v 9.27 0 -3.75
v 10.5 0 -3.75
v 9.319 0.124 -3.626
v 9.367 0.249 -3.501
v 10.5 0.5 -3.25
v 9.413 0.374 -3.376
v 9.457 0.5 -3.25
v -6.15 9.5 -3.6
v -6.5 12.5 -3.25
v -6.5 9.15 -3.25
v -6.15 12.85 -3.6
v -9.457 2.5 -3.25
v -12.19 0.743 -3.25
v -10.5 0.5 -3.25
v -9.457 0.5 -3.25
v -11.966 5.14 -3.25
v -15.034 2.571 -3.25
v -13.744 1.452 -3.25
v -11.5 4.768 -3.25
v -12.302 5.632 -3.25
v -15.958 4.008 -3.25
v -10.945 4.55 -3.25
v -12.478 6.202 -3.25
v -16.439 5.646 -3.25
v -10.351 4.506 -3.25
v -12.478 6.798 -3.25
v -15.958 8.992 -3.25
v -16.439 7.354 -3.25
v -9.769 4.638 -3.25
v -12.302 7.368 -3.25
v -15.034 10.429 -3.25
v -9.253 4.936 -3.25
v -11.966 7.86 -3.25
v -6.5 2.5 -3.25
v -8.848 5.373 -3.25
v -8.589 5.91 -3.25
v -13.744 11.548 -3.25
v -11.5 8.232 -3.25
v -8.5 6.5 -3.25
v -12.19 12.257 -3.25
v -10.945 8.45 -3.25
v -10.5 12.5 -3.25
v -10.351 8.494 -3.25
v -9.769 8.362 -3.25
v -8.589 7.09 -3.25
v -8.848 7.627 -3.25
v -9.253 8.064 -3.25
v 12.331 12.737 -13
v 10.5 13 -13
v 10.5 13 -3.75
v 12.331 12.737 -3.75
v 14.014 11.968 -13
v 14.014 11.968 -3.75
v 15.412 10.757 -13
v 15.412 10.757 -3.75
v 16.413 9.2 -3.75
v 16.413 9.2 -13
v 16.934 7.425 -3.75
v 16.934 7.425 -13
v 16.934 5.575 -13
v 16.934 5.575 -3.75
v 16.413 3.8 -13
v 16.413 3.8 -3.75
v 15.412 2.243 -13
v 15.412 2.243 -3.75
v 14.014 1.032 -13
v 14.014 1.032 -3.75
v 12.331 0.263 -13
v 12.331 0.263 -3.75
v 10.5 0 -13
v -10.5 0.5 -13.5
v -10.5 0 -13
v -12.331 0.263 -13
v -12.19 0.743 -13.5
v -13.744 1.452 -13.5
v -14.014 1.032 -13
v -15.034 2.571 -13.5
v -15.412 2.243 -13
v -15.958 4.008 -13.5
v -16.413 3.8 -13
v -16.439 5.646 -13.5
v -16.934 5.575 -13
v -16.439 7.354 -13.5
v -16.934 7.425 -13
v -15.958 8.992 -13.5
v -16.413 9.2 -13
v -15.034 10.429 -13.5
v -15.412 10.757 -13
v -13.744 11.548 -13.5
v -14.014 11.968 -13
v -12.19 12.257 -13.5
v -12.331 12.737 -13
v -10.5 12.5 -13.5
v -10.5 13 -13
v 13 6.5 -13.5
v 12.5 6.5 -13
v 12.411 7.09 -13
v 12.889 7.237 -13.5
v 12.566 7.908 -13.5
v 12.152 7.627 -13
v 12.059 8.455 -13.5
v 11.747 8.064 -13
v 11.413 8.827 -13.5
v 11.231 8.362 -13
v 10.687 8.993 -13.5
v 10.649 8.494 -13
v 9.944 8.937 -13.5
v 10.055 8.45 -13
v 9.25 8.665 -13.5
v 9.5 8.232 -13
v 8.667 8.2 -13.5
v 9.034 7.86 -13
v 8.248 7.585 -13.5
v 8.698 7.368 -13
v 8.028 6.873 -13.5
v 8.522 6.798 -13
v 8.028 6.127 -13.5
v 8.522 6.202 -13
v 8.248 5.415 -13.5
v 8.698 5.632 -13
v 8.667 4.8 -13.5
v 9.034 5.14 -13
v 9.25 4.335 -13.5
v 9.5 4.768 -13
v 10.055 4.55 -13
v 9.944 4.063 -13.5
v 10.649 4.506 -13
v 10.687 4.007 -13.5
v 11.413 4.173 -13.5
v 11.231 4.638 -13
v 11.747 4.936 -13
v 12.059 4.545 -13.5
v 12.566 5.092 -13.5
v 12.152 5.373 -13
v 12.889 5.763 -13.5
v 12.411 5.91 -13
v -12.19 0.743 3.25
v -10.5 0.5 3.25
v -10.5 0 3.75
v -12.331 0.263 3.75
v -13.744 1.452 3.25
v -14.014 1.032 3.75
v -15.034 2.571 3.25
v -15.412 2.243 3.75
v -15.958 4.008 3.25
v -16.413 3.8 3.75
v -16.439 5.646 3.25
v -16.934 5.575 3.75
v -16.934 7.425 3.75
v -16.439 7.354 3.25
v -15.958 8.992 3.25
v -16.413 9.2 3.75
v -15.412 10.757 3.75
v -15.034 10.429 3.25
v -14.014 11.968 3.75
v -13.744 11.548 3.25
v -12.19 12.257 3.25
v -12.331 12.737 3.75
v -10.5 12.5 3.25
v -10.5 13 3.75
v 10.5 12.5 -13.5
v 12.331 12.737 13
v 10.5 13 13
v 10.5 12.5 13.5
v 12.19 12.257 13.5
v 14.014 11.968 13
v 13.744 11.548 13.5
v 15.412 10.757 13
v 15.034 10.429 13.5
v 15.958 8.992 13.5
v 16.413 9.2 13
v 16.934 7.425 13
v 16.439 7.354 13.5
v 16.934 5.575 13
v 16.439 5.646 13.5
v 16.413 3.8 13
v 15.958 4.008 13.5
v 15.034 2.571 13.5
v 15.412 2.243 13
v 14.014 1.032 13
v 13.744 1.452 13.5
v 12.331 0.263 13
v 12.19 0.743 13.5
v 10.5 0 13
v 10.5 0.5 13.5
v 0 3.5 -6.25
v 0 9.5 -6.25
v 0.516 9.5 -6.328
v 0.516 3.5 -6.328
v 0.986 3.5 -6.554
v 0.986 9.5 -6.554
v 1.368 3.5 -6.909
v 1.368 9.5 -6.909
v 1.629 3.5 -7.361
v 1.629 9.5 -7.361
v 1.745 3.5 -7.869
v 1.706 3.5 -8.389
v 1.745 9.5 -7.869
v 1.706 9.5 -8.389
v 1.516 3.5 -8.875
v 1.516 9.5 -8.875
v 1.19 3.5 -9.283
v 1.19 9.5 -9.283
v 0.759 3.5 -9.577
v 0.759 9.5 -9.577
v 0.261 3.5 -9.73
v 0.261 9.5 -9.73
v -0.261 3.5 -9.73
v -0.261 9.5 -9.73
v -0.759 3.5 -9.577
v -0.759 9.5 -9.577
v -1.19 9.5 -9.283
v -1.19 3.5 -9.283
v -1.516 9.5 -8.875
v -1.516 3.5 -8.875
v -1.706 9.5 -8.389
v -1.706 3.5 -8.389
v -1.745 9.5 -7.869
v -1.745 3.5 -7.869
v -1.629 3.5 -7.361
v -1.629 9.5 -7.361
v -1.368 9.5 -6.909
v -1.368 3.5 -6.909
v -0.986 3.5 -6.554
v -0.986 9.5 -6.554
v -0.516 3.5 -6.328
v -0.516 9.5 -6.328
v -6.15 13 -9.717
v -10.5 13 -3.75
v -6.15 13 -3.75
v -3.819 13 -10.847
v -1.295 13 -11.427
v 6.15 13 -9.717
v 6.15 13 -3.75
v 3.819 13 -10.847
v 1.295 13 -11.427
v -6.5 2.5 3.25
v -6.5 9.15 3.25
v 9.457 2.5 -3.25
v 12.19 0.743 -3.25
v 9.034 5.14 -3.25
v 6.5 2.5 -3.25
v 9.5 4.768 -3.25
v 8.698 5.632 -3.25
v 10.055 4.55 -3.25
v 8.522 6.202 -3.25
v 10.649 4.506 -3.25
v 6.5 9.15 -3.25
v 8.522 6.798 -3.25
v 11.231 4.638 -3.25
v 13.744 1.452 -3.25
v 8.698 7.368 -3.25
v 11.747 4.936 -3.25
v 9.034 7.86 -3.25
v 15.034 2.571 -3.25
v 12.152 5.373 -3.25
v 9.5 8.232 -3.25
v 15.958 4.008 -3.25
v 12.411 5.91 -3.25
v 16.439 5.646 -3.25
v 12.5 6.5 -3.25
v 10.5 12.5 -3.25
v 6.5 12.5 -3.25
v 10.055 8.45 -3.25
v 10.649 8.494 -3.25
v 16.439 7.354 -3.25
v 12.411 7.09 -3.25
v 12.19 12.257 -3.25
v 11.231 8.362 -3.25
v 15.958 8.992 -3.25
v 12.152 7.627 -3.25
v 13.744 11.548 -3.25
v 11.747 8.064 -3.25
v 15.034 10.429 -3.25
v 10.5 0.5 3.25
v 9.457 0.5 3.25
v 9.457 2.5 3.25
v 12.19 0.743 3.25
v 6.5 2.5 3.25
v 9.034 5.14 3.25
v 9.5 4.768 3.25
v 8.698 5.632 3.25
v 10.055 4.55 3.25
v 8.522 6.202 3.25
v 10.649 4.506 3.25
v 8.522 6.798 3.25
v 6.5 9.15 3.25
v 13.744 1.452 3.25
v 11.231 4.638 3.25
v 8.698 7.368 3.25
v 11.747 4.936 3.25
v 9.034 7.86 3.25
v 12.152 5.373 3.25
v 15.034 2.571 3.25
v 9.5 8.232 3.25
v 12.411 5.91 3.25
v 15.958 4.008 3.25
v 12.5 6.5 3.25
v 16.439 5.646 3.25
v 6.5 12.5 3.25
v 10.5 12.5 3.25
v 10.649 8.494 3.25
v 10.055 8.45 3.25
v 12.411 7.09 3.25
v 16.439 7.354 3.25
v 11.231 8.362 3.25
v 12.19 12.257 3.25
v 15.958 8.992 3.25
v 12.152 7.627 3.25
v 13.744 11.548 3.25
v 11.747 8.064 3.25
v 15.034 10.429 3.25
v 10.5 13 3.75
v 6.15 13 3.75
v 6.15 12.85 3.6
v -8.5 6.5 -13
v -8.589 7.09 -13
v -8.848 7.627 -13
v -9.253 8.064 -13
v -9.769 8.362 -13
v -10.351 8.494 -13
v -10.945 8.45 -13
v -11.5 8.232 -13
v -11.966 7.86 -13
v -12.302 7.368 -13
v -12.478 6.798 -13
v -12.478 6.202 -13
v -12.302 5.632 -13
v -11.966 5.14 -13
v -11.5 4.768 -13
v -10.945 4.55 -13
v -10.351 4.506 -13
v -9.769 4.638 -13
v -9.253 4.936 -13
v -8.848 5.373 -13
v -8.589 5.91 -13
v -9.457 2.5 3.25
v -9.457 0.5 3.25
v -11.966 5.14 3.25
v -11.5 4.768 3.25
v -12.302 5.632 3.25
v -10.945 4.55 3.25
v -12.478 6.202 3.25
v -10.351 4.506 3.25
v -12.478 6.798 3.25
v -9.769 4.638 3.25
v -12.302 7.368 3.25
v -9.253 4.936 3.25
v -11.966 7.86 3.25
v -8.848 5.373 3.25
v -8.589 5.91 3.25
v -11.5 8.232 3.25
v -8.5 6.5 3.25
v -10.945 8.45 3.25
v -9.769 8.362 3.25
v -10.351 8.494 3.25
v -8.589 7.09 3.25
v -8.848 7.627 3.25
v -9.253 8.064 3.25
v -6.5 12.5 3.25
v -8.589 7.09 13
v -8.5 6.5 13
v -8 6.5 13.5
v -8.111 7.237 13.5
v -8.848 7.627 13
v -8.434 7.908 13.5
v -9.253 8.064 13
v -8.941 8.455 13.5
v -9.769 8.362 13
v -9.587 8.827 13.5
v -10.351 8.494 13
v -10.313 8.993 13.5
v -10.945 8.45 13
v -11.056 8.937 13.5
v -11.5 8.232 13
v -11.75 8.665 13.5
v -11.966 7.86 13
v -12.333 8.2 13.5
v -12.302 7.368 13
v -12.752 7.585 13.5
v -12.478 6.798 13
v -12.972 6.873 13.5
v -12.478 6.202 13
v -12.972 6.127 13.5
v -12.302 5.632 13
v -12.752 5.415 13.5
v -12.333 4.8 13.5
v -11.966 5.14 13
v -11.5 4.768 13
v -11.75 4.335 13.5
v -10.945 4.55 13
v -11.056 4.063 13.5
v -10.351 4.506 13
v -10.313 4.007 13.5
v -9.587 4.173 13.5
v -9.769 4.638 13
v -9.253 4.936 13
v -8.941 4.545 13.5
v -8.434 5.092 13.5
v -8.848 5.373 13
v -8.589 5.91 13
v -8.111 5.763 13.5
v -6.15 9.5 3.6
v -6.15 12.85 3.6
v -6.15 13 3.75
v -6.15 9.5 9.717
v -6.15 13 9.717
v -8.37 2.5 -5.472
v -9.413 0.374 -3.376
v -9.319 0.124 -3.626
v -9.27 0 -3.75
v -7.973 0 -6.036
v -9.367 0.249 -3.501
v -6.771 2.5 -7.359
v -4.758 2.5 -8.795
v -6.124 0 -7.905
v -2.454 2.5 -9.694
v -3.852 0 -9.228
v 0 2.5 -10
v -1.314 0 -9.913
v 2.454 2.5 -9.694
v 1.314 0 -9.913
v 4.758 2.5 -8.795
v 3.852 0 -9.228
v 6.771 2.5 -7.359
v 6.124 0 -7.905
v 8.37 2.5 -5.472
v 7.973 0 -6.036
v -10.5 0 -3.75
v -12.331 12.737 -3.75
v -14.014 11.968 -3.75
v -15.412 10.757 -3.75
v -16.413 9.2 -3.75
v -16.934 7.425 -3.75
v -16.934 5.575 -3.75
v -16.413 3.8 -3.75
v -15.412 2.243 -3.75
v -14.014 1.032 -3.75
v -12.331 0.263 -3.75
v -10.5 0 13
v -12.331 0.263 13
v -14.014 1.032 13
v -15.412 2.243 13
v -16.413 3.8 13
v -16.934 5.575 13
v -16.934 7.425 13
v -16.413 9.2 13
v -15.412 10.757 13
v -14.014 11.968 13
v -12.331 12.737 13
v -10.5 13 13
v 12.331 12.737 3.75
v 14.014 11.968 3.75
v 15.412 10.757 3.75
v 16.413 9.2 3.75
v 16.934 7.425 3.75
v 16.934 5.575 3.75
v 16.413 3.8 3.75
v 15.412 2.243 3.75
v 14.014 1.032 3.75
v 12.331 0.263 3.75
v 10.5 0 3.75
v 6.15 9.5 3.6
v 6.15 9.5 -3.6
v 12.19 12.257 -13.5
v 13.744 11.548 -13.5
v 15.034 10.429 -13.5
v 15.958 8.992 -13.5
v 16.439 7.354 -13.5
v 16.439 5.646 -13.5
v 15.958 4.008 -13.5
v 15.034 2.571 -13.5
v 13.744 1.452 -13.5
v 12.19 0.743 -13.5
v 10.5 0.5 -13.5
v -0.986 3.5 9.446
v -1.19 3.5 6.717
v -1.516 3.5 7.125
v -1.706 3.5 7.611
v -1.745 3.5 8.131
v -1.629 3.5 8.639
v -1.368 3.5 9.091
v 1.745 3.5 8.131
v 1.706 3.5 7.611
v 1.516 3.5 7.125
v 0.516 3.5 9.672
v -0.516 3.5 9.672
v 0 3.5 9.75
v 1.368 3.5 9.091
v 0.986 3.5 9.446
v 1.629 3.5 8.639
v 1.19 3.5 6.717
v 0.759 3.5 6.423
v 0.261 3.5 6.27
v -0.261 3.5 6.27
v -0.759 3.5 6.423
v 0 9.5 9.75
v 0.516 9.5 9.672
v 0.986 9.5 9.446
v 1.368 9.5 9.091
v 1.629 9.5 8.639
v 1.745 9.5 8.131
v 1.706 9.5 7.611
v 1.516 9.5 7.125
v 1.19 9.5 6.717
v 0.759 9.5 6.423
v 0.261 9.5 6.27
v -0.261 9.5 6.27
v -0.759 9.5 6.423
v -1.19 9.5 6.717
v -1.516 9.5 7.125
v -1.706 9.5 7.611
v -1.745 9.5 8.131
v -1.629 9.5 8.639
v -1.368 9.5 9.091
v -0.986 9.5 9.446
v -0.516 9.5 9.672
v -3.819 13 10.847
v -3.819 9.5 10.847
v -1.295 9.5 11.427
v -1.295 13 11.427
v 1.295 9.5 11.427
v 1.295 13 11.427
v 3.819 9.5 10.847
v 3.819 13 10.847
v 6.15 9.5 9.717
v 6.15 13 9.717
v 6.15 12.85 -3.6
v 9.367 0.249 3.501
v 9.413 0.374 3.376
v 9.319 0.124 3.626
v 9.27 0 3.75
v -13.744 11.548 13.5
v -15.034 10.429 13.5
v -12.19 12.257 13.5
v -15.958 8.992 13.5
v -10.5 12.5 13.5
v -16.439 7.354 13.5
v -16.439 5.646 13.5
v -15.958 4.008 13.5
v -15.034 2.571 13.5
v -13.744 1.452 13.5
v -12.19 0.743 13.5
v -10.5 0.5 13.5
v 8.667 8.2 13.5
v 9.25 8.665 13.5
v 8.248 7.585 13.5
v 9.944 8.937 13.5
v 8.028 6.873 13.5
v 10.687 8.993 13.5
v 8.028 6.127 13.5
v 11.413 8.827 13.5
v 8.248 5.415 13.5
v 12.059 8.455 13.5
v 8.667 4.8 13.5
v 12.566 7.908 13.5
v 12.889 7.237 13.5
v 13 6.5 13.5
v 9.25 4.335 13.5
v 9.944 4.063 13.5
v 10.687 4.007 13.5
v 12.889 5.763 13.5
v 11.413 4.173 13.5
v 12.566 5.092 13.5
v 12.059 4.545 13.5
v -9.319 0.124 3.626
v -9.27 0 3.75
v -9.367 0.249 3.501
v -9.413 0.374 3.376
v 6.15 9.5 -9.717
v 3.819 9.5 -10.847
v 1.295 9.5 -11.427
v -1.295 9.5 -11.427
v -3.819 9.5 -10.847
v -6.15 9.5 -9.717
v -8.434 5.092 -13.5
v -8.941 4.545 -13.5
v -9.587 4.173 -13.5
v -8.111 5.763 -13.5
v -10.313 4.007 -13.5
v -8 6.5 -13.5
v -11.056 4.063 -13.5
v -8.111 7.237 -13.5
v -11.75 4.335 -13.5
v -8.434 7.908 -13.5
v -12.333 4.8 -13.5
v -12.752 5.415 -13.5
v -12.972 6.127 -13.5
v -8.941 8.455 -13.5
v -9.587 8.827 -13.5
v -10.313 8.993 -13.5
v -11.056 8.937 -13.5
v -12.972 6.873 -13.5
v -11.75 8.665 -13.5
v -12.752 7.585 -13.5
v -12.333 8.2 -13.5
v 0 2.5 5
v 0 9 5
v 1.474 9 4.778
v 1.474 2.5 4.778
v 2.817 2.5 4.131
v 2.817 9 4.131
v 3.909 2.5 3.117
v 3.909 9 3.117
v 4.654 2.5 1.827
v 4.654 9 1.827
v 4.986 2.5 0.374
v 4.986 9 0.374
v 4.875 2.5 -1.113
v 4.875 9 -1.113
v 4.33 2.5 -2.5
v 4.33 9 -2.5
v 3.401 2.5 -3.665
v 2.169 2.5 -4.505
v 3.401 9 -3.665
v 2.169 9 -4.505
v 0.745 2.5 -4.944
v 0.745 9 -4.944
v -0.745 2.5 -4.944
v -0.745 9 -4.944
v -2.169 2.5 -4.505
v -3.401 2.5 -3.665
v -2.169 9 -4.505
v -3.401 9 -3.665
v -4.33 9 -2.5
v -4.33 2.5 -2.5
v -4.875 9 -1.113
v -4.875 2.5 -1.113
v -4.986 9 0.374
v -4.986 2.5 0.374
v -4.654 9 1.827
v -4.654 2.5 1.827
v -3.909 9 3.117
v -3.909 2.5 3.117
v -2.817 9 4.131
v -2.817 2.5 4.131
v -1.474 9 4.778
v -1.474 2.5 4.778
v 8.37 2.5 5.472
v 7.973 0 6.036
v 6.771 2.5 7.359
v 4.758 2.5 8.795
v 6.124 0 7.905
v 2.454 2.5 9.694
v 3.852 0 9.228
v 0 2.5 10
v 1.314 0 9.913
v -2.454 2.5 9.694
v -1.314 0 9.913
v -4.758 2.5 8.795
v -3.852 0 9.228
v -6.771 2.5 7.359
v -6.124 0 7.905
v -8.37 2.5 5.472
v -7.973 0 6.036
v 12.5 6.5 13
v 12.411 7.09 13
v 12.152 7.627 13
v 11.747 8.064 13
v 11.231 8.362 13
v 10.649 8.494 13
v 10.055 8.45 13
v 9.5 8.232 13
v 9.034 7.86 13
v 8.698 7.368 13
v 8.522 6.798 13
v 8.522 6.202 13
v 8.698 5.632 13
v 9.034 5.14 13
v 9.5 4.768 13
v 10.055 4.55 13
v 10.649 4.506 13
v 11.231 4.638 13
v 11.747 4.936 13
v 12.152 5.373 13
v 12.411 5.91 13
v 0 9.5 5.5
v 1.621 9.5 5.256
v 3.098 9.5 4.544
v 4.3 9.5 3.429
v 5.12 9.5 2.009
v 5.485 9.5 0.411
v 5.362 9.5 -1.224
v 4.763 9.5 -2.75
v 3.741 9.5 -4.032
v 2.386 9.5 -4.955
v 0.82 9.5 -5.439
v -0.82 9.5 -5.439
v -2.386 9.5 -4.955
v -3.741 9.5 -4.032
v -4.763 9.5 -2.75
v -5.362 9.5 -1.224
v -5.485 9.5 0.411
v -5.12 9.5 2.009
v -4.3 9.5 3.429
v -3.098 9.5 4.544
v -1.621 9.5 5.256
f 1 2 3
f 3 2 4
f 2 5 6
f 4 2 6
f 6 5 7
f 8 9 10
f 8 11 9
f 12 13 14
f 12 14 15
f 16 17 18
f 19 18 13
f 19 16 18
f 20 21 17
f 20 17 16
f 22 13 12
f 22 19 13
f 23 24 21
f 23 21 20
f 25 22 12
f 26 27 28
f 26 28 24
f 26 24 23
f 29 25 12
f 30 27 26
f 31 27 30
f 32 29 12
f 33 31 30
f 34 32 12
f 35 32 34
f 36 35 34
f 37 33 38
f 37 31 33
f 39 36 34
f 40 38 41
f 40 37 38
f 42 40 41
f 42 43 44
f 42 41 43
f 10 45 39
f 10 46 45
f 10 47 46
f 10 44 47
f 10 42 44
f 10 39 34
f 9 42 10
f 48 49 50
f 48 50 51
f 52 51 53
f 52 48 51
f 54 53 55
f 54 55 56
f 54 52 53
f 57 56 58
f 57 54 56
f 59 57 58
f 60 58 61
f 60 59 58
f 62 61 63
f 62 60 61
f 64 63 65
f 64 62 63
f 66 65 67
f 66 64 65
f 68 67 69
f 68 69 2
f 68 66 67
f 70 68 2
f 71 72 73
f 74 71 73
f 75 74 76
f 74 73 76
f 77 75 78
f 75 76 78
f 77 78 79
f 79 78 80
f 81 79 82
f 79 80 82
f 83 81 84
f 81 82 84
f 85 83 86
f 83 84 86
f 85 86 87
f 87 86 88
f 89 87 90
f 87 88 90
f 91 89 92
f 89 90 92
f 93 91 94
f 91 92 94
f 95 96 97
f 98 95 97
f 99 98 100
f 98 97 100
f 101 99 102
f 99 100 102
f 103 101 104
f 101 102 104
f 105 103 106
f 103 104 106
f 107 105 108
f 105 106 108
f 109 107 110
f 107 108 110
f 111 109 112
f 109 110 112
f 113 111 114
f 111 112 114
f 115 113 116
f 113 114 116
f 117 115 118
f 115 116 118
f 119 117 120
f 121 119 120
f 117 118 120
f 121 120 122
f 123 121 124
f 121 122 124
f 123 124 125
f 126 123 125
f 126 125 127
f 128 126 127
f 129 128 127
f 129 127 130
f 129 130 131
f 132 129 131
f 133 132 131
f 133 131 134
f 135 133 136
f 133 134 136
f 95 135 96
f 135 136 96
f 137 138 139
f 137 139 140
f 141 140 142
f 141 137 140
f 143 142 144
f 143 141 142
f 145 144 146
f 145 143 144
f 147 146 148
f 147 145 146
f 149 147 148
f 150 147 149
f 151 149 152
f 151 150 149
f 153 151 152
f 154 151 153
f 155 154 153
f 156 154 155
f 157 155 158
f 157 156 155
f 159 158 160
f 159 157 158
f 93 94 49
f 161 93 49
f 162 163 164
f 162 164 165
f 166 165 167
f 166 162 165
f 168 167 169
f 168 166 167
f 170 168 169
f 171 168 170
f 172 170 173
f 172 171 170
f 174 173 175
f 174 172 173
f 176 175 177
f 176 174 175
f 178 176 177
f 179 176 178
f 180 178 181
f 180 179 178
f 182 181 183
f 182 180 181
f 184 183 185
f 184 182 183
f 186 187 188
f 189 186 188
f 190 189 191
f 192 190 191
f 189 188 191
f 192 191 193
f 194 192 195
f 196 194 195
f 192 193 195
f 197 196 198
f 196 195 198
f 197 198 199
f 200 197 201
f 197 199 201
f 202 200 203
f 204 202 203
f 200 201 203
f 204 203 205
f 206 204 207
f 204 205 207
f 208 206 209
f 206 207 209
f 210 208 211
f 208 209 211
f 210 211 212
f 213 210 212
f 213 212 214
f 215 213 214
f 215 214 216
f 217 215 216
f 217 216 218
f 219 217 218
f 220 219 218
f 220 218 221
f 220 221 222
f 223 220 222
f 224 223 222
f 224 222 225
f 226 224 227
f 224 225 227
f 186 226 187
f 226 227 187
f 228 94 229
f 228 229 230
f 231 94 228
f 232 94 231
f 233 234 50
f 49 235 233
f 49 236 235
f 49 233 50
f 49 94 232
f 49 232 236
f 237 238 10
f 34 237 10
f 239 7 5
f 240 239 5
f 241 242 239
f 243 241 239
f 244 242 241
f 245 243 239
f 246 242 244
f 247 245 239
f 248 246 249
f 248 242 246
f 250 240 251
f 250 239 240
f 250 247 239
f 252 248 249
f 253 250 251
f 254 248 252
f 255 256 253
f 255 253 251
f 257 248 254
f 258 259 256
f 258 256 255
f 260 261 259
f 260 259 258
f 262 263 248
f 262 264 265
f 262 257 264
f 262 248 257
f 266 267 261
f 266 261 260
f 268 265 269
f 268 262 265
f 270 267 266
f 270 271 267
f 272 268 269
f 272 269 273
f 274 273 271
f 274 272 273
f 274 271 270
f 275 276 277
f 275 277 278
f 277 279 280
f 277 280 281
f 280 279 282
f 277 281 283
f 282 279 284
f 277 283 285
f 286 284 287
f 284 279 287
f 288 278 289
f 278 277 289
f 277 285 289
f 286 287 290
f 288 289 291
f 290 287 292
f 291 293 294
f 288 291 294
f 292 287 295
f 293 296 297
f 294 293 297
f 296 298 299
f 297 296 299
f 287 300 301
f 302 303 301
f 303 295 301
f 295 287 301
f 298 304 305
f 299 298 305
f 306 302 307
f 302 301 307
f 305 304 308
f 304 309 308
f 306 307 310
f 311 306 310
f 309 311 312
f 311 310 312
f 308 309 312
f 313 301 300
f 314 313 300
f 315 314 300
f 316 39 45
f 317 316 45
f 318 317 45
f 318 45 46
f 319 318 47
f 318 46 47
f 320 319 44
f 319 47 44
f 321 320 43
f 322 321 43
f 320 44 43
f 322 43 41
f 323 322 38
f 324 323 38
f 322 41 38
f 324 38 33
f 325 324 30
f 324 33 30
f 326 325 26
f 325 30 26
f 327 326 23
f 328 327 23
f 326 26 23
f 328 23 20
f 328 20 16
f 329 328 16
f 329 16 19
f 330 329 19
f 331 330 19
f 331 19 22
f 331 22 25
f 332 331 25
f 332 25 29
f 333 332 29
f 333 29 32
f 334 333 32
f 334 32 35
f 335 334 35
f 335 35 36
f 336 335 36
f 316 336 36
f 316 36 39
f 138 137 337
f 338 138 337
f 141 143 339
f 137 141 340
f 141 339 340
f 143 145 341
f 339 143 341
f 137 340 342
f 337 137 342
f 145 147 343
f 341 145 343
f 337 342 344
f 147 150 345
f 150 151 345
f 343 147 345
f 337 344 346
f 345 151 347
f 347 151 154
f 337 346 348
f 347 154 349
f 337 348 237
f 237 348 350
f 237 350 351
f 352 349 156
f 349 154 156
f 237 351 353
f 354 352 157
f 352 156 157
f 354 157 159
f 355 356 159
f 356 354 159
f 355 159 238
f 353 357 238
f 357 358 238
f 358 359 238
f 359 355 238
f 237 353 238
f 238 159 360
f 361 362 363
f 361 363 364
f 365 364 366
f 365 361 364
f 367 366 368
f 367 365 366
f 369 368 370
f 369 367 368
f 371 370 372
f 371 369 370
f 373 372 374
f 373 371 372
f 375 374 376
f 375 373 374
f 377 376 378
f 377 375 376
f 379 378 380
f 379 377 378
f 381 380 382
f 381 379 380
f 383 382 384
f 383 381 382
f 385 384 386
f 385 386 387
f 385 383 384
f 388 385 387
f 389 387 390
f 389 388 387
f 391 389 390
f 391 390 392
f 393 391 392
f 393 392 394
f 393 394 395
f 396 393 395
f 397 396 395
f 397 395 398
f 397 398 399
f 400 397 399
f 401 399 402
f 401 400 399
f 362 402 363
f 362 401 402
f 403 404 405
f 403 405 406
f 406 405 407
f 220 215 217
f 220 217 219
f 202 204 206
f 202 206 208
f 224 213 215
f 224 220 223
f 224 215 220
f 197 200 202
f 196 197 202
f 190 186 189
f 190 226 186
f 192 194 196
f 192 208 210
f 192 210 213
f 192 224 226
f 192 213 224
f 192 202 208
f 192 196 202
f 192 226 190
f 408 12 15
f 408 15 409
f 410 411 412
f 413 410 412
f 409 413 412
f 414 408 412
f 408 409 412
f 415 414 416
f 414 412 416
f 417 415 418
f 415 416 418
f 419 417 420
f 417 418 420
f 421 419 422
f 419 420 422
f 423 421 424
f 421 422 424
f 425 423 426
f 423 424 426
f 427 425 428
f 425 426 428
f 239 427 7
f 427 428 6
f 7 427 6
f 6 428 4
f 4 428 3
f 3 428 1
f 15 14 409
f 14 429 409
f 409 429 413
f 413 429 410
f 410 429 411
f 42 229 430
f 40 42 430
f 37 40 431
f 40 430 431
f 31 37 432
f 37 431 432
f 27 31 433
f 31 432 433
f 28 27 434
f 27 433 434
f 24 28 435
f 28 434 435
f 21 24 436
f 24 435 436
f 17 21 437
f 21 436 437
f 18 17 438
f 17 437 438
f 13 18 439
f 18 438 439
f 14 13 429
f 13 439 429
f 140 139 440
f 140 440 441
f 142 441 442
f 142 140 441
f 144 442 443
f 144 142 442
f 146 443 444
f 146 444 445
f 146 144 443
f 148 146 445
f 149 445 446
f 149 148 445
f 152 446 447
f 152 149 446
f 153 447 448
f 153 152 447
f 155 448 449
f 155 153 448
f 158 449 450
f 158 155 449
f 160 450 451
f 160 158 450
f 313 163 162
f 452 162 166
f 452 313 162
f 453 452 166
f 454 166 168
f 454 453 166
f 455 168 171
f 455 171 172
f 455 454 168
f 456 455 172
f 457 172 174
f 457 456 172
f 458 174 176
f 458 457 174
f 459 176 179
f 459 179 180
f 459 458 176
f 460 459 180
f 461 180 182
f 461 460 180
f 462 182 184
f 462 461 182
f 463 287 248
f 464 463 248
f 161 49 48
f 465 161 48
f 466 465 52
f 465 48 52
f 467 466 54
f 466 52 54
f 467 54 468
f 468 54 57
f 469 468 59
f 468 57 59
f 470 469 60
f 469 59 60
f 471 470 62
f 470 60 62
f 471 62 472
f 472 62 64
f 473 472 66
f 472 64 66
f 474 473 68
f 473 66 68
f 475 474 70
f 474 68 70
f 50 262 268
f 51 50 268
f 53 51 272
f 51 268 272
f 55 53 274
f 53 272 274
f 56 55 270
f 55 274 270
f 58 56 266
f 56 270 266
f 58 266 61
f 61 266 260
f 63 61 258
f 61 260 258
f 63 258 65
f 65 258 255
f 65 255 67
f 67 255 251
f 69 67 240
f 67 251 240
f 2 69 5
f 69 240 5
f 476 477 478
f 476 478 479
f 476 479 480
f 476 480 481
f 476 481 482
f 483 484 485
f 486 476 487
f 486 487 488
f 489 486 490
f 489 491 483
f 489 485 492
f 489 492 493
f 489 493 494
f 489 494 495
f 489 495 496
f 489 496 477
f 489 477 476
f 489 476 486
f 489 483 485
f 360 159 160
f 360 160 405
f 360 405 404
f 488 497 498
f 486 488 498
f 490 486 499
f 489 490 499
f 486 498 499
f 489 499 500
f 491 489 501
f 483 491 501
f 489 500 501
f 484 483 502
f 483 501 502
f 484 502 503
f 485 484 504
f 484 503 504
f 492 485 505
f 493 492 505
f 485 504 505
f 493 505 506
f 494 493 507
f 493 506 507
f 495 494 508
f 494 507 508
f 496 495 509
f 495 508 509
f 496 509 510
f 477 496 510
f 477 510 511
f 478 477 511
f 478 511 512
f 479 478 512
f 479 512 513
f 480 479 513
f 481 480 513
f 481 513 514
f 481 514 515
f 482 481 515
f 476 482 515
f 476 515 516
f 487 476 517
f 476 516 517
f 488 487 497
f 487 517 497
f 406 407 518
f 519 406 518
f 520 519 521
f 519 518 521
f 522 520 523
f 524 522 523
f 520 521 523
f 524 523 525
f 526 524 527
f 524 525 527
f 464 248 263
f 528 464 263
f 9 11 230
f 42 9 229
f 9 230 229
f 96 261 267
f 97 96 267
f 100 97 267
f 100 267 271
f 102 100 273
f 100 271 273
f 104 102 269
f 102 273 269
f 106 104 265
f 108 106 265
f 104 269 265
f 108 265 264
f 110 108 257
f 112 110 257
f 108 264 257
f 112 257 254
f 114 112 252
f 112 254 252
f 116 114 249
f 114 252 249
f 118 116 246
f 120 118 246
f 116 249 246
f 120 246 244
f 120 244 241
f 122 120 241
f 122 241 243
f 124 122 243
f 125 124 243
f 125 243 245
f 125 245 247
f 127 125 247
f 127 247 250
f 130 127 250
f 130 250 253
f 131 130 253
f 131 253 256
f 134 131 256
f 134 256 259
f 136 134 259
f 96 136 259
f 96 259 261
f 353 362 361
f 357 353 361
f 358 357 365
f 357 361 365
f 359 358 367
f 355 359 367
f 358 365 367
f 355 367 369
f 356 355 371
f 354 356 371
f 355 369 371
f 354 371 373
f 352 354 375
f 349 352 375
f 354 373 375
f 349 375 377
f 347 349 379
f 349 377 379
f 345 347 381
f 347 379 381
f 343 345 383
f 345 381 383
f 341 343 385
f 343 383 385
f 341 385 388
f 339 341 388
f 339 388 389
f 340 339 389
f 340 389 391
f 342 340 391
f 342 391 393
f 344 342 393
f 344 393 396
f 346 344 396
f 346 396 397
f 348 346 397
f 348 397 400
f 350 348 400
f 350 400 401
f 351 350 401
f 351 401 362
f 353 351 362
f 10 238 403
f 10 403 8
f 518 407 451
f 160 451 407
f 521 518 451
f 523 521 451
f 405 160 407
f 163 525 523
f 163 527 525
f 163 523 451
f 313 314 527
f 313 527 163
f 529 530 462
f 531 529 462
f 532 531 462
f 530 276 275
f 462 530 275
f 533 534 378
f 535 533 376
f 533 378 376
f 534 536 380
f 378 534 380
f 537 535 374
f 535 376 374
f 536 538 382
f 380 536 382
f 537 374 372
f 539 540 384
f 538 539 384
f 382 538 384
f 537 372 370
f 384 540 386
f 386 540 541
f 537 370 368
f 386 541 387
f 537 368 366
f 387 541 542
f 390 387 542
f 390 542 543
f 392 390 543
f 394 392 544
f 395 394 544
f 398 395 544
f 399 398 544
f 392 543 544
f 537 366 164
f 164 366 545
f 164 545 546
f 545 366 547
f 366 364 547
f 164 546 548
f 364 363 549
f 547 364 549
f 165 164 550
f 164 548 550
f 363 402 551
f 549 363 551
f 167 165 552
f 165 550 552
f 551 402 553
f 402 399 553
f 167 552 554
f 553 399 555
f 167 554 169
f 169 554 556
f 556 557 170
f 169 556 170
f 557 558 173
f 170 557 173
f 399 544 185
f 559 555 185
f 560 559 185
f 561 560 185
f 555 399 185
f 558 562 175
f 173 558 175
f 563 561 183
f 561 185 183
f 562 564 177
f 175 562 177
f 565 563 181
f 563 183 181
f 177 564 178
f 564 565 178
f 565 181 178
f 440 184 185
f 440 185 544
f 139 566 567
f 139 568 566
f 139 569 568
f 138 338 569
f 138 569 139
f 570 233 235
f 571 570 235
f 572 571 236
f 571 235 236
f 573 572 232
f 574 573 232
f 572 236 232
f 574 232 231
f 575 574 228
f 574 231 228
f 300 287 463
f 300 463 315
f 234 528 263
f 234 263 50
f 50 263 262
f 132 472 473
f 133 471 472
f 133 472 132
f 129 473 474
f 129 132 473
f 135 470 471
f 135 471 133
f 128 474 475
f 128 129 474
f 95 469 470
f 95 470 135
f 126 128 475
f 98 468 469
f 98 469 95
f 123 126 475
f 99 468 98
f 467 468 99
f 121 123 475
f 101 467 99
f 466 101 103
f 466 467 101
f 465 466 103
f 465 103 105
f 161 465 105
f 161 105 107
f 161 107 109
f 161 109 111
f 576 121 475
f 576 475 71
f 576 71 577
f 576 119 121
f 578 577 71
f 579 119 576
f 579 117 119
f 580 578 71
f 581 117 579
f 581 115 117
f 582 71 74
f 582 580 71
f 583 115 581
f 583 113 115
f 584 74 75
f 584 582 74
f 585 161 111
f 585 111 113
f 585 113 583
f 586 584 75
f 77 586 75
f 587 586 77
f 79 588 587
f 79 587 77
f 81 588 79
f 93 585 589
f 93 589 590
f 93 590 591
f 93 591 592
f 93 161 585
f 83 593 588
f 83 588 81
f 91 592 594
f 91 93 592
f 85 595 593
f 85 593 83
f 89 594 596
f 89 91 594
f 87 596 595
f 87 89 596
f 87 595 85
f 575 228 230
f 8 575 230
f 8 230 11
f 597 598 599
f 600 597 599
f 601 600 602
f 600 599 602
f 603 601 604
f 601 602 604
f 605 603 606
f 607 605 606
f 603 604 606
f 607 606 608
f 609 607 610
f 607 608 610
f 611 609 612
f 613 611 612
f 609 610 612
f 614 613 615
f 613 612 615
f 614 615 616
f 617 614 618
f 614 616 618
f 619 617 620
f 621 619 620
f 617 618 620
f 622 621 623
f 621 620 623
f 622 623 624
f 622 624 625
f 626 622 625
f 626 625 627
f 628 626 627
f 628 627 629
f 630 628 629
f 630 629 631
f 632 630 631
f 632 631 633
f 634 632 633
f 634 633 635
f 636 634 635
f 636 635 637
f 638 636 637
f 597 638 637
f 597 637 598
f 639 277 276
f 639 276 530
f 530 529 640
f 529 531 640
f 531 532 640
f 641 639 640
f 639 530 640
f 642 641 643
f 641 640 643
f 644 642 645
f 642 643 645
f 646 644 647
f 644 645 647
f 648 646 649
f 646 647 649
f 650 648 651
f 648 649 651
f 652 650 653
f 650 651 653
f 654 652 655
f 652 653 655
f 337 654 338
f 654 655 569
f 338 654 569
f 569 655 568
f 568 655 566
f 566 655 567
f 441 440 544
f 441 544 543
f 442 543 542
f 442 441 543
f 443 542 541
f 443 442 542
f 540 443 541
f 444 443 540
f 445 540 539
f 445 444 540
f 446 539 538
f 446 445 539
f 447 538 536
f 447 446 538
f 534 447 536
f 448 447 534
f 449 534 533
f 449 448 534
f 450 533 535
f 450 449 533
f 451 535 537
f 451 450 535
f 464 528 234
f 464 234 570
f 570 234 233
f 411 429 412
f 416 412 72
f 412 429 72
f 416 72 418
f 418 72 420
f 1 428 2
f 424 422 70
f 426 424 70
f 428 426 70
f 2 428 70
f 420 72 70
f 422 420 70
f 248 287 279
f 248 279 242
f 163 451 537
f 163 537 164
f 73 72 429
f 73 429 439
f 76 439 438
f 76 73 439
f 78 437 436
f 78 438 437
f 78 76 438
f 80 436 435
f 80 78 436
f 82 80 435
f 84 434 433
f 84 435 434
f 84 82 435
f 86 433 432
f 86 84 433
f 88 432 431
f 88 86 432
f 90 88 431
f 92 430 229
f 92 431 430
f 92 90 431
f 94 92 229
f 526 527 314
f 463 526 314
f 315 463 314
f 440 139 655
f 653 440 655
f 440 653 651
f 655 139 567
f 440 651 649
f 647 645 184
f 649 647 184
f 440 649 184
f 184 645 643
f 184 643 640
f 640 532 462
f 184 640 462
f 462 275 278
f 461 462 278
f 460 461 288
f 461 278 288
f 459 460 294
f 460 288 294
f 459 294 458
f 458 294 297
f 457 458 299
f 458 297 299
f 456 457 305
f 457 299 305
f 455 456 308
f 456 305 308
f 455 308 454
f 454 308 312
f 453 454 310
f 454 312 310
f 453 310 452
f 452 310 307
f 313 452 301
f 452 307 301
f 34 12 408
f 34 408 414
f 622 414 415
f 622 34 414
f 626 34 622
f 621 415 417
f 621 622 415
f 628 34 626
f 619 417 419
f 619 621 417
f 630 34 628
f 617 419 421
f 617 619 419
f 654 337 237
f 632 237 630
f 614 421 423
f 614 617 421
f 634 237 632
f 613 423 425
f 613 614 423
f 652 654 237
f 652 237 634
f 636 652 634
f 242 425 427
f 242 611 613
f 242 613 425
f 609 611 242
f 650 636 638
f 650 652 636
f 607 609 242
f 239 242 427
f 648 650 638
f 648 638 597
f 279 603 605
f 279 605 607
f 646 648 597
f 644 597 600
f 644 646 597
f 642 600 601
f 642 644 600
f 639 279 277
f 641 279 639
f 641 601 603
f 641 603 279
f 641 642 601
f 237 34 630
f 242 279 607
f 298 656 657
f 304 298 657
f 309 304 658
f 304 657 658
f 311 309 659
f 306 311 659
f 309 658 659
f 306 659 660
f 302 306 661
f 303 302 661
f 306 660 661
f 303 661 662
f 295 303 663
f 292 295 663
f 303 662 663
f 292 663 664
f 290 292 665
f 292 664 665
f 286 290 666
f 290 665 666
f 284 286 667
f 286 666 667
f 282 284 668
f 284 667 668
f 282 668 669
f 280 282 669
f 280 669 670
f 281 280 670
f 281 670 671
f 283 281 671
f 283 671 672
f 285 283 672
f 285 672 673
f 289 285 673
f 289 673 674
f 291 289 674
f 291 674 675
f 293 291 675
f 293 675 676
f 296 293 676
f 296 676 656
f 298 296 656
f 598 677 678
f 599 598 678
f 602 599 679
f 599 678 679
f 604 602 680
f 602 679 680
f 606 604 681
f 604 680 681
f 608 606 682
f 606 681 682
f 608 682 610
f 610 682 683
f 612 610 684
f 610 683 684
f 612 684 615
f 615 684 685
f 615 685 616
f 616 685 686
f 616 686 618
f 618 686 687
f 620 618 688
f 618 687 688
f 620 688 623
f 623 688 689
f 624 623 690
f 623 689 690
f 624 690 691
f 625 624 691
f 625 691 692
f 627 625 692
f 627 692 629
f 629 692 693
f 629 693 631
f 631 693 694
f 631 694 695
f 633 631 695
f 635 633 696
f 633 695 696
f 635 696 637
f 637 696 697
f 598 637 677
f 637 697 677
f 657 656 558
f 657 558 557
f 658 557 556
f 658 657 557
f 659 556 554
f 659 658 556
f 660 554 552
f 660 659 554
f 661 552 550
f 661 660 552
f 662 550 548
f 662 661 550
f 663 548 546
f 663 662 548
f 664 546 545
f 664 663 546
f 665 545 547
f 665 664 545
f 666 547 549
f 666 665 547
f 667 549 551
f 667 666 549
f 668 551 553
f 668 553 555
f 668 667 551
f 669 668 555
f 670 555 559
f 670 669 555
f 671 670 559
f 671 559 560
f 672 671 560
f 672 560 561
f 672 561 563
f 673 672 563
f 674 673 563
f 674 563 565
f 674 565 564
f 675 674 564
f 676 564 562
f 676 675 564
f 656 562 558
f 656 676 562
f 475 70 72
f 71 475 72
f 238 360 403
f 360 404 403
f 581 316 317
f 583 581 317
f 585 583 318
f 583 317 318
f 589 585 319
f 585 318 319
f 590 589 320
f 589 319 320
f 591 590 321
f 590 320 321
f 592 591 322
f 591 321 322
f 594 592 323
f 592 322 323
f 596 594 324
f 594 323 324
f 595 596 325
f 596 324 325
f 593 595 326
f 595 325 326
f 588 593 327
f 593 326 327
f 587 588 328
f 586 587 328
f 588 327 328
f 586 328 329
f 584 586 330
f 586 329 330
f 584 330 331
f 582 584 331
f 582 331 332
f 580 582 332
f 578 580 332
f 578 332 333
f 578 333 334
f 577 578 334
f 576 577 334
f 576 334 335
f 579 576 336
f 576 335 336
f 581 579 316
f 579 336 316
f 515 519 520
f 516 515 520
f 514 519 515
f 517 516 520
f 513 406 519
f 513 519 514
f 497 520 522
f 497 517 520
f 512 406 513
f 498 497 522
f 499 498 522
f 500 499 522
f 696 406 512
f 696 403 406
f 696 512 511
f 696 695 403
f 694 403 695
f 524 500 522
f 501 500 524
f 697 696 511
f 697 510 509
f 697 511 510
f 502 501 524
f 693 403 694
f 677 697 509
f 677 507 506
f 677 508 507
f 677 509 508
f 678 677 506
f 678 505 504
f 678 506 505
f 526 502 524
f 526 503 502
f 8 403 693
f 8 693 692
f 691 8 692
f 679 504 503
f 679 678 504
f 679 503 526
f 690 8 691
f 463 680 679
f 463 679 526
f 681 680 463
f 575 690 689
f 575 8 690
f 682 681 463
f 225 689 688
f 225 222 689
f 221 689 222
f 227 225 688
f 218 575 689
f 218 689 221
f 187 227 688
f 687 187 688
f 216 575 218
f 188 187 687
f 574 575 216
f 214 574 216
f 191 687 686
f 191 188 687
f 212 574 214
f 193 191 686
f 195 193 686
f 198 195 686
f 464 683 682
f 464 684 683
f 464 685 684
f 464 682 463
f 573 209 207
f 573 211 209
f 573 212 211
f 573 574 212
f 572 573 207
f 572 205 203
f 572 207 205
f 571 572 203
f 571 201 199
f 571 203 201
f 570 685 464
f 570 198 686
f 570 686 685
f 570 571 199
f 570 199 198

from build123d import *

# Parameters (mm, degrees)
SKETCH1_W           = 21
SKETCH1_H           = 27
BOSS_EXTRUDE1_DEPTH = 13
SKETCH8_R           = 6.5
BOSS_EXTRUDE2_DEPTH = 27
SKETCH2_R           = 5
CUT_EXTRUDE1_DEPTH  = 13
SKETCH3_W           = 21.50173114
SKETCH3_H           = 6.5
CUT_EXTRUDE2_DEPTH  = 13
SKETCH7_W           = 13
SKETCH7_H           = 6.5
CUT_EXTRUDE7_DEPTH  = 3.5
SKETCH4_R           = 2
CUT_EXTRUDE3_DEPTH  = 35
CUT_EXTRUDE4_DEPTH  = 3.5
SKETCH6_R           = 1.75
CUT_EXTRUDE5_DEPTH  = 6
CHAMFER1_SIZE       = 0.5
CHAMFER2_SIZE       = 0.35
CHAMFER3_SIZE       = 0.35
SKETCH9_R           = 10
CUT_EXTRUDE8_DEPTH  = 2.5


with BuildPart() as part:
    # Sketch1 → Boss-Extrude1 (new body)
    with BuildSketch(Plane(origin=(0, 0, 0), x_dir=(1, 0, 0), z_dir=(0, 1, 0))):
        Rectangle(SKETCH1_W, SKETCH1_H)
    extrude(amount=BOSS_EXTRUDE1_DEPTH)

    # Sketch8 → Boss-Extrude2 (add)
    with BuildSketch(Plane(origin=(0, 0, -13.5), x_dir=(-1, 0, 0), z_dir=(0, 0, -1))):
        with Locations((-10.5, 6.5)):
            Circle(SKETCH8_R)
        with Locations((10.5, 6.5)):
            Circle(SKETCH8_R)
    extrude(amount=-BOSS_EXTRUDE2_DEPTH)

    # Sketch2 → Cut-Extrude1 (cut)
    with BuildSketch(Plane(origin=(0, 13, 0), x_dir=(1, 0, 0), z_dir=(0, 1, 0))):
        with Locations(Location((0, 0, 0), (0, 0, 270))):
            Circle(SKETCH2_R)
    extrude(amount=-CUT_EXTRUDE1_DEPTH, mode=Mode.SUBTRACT)

    # Sketch3 → Cut-Extrude2 (cut)
    with BuildSketch(Plane(origin=(0, 13, 0), x_dir=(1, 0, 0), z_dir=(0, 1, 0))):
        with Locations((17.25086557, 0)):
            Rectangle(SKETCH3_W, SKETCH3_H)
        with Locations((-17.25086557, 0)):
            Rectangle(SKETCH3_W, SKETCH3_H)
    extrude(amount=-CUT_EXTRUDE2_DEPTH, mode=Mode.SUBTRACT)

    # Sketch7 → Cut-Extrude7 (cut)
    with BuildSketch(Plane(origin=(0, 13, 0), x_dir=(1, 0, 0), z_dir=(0, 1, 0))):
        Rectangle(SKETCH7_W, SKETCH7_H)
    extrude(amount=-CUT_EXTRUDE7_DEPTH, mode=Mode.SUBTRACT)

    # Sketch4 → Cut-Extrude3 (cut)
    with BuildSketch(Plane.XY.offset(13.5)):
        with Locations((-10.5, 6.5)):
            Circle(SKETCH4_R)
        with Locations((10.5, 6.5)):
            Circle(SKETCH4_R)
    extrude(amount=-CUT_EXTRUDE3_DEPTH, mode=Mode.SUBTRACT)

    # Sketch5 → Cut-Extrude4 (cut)
    with BuildSketch(Plane(origin=(0, 13, 0), x_dir=(1, 0, 0), z_dir=(0, 1, 0))):
        with BuildLine():
            Line((-6.15, 9.717381334), (-6.15, -9.717381334))
            ThreePointArc((-6.15, -9.717381334), (0, -11.5), (6.15, -9.717381334))
            Line((6.15, -9.717381334), (6.15, 9.717381334))
            ThreePointArc((6.15, 9.717381334), (0, 11.5), (-6.15, 9.717381334))
        make_face()
    extrude(amount=-CUT_EXTRUDE4_DEPTH, mode=Mode.SUBTRACT)

    # Sketch6 → Cut-Extrude5 (cut)
    with BuildSketch(Plane(origin=(0, 9.5, 0), x_dir=(1, 0, 0), z_dir=(0, 1, 0))):
        with Locations(Location((0, 8, 0), (0, 0, 270))):
            Circle(SKETCH6_R)
        with Locations(Location((0, -8, 0), (0, 0, 270))):
            Circle(SKETCH6_R)
    extrude(amount=-CUT_EXTRUDE5_DEPTH, mode=Mode.SUBTRACT)

    # Chamfer1
    chamfer1_edges = [part.edges().sort_by_distance(p)[0] for p in [
        (-12.5, 6.5, -13.5),
        (-12.5, 6.5, 13.5),
        (8.5, 6.5, -13.5),
        (8.5, 6.5, 13.5),
        (8.325, 13, 3.25),
        (-8.325, 13, -3.25),
        (17, 6.5, -13.5),
        (17, 6.5, 13.5),
        (0, 13, 13.5),
        (-17, 6.5, -13.5),
        (-17, 6.5, 13.5),
        (0, 0, -5),
        (-17, 6.5, -3.25),
        (-17, 6.5, 3.25),
        (17, 6.5, -3.25),
        (17, 6.5, 3.25),
        (8.5, 0, 3.25),
        (8.5, 0, -3.25),
        (8.325, 13, -3.25),
        (0, 0, 13.5),
        (-8.5, 0, 3.25),
        (-8.5, 0, -3.25),
        (0, 0, -13.5),
        (-8.325, 13, 3.25),
        (0, 9.5, -5),
        (0, 13, -13.5),
    ]]
    chamfer(chamfer1_edges, length=CHAMFER1_SIZE)

    # Chamfer2
    chamfer2_edges = [part.edges().sort_by_distance(p)[0] for p in [
        (6.15, 11, 3.25),
        (6.15, 11, -3.25),
        (-6.15, 11, -3.25),
        (-6.15, 11, 3.25),
    ]]
    chamfer(chamfer2_edges, length=CHAMFER2_SIZE)

    # Chamfer3
    chamfer3_edges = [part.edges().sort_by_distance(p)[0] for p in [
        (6.5, 9.5, 0),
        (-6.5, 9.5, 0),
        (-6.5, 0, 0),
        (6.5, 0, 0),
    ]]
    chamfer(chamfer3_edges, length=CHAMFER3_SIZE)

    # Sketch9 → Cut-Extrude8 (cut)
    with BuildSketch(Plane.XZ):
        Circle(SKETCH9_R)
    extrude(amount=-CUT_EXTRUDE8_DEPTH, mode=Mode.SUBTRACT)


solid = part.part
